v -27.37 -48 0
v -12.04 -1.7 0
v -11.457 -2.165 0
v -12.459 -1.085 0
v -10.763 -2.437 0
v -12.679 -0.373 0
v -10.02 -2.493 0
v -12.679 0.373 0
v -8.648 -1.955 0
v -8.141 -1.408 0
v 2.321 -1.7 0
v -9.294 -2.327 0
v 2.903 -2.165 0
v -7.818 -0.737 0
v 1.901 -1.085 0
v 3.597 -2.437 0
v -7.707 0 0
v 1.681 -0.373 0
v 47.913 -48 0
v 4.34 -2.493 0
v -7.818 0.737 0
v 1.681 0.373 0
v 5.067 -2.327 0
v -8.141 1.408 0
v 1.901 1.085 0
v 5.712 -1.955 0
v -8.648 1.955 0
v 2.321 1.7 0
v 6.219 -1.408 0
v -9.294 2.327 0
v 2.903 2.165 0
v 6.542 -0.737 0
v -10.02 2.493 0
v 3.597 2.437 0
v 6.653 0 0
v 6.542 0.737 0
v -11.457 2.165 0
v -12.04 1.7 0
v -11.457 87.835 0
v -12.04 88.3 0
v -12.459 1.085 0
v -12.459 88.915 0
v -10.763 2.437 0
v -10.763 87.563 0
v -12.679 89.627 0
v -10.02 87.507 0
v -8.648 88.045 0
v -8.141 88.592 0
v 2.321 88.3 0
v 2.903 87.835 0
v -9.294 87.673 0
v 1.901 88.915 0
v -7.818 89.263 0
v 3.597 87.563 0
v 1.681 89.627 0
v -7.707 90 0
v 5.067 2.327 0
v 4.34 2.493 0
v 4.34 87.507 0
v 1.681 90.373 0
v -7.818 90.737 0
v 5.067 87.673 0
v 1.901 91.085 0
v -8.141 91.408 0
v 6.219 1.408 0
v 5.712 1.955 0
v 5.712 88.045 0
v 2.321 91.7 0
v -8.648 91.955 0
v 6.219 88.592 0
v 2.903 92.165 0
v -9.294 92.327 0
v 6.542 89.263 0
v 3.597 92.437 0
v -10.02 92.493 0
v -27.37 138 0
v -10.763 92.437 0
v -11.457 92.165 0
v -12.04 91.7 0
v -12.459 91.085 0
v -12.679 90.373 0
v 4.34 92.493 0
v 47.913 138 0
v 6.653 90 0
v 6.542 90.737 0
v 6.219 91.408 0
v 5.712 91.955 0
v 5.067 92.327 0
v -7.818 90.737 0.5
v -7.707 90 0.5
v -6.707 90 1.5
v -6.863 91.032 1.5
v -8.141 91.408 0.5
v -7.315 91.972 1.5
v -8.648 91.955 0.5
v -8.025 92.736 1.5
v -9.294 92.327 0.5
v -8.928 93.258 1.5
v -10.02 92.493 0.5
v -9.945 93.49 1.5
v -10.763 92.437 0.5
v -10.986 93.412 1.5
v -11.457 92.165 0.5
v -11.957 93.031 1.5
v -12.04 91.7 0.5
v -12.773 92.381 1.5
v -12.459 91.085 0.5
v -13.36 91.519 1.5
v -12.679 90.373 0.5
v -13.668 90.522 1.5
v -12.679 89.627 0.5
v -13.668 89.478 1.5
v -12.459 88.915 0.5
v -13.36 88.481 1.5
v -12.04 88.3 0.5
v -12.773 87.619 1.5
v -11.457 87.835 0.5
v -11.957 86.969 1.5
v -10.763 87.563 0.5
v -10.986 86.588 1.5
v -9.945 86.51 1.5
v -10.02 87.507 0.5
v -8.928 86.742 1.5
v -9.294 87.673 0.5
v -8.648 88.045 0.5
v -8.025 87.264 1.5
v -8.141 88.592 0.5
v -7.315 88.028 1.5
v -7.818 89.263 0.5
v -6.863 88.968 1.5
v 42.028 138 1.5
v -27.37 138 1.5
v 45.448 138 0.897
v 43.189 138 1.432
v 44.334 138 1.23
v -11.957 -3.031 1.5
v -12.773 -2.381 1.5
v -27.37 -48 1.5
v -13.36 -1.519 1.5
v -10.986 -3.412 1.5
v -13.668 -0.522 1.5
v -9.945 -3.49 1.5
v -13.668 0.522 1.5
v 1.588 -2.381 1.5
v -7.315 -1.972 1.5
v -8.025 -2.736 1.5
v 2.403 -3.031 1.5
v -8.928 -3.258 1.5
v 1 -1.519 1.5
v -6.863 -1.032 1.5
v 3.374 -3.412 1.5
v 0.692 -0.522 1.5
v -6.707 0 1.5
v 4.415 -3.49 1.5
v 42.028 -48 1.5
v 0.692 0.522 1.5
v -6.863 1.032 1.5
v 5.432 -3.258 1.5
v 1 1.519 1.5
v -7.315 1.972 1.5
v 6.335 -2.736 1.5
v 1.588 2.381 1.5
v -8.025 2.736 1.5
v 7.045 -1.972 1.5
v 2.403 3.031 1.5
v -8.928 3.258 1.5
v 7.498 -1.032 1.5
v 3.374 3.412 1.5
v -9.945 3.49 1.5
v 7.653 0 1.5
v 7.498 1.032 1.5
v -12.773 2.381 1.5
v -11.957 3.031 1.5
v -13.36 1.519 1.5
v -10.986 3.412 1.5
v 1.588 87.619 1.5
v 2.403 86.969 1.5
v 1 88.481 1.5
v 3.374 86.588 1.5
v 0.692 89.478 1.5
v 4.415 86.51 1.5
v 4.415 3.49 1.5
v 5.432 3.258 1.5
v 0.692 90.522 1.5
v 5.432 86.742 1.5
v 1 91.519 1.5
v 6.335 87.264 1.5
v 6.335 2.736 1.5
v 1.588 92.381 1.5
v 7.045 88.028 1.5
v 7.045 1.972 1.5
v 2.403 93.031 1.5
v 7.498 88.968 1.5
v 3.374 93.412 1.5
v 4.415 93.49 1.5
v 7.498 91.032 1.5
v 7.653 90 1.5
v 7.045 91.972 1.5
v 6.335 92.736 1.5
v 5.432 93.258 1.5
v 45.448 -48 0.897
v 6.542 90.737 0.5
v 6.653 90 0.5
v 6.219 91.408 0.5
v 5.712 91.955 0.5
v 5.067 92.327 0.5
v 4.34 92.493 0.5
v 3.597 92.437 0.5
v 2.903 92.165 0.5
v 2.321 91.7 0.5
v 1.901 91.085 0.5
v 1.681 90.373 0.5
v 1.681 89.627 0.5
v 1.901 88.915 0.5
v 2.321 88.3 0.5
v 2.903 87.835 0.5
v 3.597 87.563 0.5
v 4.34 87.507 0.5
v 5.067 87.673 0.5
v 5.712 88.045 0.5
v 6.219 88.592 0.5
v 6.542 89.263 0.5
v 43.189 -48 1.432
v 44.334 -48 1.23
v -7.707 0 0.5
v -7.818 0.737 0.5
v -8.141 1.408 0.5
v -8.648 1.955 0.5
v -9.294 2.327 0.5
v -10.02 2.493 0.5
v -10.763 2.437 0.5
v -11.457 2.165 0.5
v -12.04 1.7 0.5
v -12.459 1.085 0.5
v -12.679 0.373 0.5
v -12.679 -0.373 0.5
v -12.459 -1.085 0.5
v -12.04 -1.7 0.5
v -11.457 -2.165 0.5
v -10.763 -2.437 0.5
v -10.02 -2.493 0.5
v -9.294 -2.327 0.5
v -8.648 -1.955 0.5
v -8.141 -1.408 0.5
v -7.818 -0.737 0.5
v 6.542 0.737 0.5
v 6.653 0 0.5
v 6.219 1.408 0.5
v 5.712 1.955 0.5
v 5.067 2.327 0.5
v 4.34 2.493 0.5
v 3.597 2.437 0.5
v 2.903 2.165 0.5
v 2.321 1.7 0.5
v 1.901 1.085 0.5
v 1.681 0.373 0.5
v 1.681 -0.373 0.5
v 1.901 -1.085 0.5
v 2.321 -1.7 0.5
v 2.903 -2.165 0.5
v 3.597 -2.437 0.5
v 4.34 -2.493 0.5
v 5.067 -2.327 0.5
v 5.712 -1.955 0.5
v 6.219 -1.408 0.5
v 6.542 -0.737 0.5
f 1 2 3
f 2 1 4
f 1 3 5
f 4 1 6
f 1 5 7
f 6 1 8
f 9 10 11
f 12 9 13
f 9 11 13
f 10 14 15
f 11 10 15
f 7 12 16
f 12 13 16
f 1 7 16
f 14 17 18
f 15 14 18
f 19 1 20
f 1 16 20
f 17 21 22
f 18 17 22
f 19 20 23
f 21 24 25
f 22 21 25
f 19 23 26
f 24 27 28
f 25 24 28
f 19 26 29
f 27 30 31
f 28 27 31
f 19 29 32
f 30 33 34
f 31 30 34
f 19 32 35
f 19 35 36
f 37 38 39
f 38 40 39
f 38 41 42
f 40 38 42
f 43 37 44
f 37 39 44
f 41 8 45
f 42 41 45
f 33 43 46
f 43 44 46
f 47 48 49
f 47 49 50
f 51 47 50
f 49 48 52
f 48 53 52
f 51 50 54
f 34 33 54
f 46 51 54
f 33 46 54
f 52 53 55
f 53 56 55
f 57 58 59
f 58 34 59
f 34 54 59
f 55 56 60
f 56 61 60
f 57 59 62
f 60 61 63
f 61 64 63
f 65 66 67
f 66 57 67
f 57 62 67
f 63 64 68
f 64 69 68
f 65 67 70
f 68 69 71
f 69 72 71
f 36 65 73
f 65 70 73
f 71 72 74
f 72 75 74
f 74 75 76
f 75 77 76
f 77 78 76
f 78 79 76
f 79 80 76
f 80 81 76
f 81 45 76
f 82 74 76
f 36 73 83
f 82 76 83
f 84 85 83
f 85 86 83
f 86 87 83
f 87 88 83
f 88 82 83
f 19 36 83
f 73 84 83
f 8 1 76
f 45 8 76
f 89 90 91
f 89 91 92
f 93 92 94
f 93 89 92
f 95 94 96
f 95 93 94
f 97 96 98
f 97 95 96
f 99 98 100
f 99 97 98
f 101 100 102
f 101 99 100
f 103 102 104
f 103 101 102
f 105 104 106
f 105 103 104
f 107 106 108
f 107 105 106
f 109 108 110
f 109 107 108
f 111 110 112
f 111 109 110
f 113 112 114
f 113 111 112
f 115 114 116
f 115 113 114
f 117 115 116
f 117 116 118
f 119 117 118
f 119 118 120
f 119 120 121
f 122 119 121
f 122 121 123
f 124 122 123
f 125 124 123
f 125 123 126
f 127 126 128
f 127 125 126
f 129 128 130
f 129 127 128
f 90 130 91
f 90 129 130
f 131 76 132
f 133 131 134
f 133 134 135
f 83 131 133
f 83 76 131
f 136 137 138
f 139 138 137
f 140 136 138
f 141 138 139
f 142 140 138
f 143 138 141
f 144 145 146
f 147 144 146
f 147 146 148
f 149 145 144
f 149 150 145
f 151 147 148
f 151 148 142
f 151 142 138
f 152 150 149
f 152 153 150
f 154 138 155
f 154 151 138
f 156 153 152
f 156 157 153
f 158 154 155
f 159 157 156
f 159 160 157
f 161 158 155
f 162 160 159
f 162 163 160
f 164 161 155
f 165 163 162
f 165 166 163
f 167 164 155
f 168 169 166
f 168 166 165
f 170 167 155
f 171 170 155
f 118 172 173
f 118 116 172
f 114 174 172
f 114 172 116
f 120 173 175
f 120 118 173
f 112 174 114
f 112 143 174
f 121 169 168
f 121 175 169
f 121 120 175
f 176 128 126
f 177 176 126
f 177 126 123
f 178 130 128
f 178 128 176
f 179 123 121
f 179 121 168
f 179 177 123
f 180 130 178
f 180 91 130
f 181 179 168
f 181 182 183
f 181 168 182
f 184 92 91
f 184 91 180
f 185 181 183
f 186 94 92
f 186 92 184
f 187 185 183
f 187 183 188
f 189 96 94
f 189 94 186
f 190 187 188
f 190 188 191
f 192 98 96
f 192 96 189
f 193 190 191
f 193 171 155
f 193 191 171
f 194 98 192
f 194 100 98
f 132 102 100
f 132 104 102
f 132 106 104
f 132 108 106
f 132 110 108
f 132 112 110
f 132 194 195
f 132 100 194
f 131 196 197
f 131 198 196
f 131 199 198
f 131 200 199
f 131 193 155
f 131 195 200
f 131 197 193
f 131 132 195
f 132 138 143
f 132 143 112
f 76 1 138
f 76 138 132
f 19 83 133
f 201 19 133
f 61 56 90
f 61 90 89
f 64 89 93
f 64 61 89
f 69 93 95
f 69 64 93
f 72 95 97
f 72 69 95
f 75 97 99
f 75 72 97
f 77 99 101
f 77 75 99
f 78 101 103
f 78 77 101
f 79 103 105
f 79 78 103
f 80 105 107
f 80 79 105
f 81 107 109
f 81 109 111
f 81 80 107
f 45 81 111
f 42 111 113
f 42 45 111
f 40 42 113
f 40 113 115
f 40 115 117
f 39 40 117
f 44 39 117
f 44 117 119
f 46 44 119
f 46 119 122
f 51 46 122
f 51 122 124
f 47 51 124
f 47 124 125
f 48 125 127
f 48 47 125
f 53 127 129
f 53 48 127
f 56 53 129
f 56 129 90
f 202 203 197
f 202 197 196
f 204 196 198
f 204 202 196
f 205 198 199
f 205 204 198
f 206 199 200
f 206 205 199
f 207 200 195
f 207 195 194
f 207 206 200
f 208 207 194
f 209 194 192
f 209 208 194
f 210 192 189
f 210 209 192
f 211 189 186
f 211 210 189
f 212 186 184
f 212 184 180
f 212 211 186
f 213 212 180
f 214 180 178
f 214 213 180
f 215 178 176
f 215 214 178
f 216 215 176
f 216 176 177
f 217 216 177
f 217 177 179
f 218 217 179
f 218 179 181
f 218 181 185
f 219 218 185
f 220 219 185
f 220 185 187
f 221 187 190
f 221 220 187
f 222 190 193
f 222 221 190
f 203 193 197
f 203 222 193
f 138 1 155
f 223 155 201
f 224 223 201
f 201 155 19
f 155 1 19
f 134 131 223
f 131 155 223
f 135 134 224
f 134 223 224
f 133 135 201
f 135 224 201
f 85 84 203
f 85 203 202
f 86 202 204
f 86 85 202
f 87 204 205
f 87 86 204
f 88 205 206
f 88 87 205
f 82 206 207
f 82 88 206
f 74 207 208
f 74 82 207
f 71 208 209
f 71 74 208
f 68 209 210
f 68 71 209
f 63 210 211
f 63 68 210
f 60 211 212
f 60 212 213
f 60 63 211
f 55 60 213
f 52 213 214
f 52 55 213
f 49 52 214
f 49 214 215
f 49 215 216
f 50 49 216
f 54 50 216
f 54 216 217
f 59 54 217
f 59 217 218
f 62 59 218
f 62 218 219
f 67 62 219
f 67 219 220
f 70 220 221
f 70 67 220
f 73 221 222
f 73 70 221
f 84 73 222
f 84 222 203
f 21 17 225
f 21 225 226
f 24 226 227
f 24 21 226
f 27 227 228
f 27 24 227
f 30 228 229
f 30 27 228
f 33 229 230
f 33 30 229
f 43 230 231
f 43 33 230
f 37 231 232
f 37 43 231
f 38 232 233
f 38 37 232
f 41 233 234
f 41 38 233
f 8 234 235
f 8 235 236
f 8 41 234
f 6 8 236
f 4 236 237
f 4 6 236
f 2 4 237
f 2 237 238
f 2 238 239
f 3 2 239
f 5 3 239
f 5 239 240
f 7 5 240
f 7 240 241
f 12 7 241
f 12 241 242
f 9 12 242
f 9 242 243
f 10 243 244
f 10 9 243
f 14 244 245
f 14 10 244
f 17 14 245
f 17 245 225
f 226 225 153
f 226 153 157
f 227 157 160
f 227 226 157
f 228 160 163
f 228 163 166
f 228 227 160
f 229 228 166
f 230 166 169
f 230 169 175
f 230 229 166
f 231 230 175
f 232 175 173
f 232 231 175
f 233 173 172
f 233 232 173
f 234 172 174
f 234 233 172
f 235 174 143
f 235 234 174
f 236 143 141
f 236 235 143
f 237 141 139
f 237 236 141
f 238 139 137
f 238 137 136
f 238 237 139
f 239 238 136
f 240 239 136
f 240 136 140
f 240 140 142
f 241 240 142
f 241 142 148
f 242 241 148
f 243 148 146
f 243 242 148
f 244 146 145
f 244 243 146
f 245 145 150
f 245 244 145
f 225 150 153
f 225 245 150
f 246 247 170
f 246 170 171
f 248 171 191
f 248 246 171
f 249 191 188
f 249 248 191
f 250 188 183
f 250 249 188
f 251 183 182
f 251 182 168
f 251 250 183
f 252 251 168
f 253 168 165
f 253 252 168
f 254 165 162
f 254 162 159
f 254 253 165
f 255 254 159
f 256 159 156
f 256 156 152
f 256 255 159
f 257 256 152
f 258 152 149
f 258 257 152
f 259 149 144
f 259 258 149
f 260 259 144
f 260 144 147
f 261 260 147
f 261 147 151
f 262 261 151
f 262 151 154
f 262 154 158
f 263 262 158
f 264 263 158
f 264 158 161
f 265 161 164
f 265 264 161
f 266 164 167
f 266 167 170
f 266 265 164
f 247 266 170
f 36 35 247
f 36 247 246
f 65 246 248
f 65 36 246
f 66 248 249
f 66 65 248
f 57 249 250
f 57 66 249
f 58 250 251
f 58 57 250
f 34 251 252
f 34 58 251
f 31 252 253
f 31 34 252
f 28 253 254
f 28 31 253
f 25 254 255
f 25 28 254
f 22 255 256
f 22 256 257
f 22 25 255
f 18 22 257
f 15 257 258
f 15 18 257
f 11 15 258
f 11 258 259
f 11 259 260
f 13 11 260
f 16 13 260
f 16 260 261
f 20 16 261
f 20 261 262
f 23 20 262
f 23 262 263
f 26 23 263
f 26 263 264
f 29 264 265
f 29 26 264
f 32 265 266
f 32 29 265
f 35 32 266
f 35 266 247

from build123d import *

# Parameters (mm, degrees)
ESQUISSE1_W        = 75.282935443
ESQUISSE1_H        = 186
ESQUISSE1_R        = 2.5
BOSS_EXTRU_1_DEPTH = 1.5
CHANFREIN3_SIZE    = 1.5
CHANFREIN3_SIZE_2  = 4.121216129
CONG_2_R           = 10
CHANFREIN4_SIZE    = 1


with BuildPart() as part:
    # Esquisse1 → Boss.-Extru.1 (new body)
    with BuildSketch(Plane.XY):
        with Locations((10.271299444, 45)):
            Rectangle(ESQUISSE1_W, ESQUISSE1_H)
        with Locations((-10.20705442, 90)):
            Circle(ESQUISSE1_R, mode=Mode.SUBTRACT)
        with Locations((4.153227182, 90)):
            Circle(ESQUISSE1_R, mode=Mode.SUBTRACT)
        with Locations((-10.20705442, 0)):
            Circle(ESQUISSE1_R, mode=Mode.SUBTRACT)
        with Locations((4.153227182, 0)):
            Circle(ESQUISSE1_R, mode=Mode.SUBTRACT)
    extrude(amount=BOSS_EXTRU_1_DEPTH)

    # Chanfrein3
    # the kernel refuses this chamfer: 4.121216129, 1.5 mm, written as the material it takes off along each edge
    with BuildSketch(Plane(origin=(47.912767165, 148.691237174, 1.5), x_dir=(0.09904090225205177, 0, -0.9950833631817484), z_dir=(0, -1, 0))) as chanfrein3_piece_1:
        Polygon((CHANFREIN3_SIZE * 0.995083363182, -CHANFREIN3_SIZE * 0.0990409022521), (-CHANFREIN3_SIZE_2 * 0.0990409022564, -CHANFREIN3_SIZE_2 * 0.995083363226), (0, 0), align=None)
    extrude(amount=207.382474348, mode=Mode.SUBTRACT)

    # Congé2
    cong_2_edges = [part.edges().sort_by_distance(p)[0] for p in [
        (43.791551035, 45, 1.5),
    ]]
    fillet(cong_2_edges, radius=CONG_2_R)

    # Chanfrein4
    chanfrein4_edges = [part.edges().sort_by_distance(p)[0] for p in [
        (-12.70705442, 90, 1.5),
        (1.653227182, 90, 1.5),
        (-12.70705442, 0, 1.5),
        (1.653227182, 0, 1.5),
    ]]
    chamfer(chanfrein4_edges, length=CHANFREIN4_SIZE)


solid = part.part
